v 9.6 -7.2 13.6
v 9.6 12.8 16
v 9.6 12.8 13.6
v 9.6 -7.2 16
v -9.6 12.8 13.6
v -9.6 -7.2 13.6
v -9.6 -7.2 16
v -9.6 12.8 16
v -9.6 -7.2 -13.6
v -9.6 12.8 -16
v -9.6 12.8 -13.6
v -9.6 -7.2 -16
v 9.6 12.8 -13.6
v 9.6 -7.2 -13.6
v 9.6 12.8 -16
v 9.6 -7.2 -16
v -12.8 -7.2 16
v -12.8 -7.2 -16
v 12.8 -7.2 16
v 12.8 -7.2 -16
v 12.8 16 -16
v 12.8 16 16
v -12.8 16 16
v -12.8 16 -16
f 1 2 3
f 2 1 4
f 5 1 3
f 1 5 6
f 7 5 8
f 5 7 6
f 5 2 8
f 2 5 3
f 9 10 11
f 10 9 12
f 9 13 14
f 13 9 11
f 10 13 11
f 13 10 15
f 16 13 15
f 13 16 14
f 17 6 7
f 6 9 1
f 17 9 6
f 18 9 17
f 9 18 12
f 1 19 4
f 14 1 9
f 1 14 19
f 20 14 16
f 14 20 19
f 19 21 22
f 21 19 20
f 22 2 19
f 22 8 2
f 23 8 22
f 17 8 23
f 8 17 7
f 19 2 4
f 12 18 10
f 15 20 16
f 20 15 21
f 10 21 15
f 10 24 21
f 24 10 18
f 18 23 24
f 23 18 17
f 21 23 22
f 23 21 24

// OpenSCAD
size=32; //block=32 //item=8



//cube([size*0.8,size*0.8,size*0.8],center=true);
difference(){
cube([size*0.8,size*1,size*1],center=true);

union(){
translate([0,-size*0.375,0]){
cube([size*1*2,size*0.3,size*1*2],center=true);	//front
};	//translate
for(i=[0:1:2]){	//top/bottom
rotate([180*i,0,0]){
translate([0,0,size*0.5]){
cube([size*0.6,size*0.8,size*0.15],center=true);
};	//translate
};	//rotate
};	//for
};

};
